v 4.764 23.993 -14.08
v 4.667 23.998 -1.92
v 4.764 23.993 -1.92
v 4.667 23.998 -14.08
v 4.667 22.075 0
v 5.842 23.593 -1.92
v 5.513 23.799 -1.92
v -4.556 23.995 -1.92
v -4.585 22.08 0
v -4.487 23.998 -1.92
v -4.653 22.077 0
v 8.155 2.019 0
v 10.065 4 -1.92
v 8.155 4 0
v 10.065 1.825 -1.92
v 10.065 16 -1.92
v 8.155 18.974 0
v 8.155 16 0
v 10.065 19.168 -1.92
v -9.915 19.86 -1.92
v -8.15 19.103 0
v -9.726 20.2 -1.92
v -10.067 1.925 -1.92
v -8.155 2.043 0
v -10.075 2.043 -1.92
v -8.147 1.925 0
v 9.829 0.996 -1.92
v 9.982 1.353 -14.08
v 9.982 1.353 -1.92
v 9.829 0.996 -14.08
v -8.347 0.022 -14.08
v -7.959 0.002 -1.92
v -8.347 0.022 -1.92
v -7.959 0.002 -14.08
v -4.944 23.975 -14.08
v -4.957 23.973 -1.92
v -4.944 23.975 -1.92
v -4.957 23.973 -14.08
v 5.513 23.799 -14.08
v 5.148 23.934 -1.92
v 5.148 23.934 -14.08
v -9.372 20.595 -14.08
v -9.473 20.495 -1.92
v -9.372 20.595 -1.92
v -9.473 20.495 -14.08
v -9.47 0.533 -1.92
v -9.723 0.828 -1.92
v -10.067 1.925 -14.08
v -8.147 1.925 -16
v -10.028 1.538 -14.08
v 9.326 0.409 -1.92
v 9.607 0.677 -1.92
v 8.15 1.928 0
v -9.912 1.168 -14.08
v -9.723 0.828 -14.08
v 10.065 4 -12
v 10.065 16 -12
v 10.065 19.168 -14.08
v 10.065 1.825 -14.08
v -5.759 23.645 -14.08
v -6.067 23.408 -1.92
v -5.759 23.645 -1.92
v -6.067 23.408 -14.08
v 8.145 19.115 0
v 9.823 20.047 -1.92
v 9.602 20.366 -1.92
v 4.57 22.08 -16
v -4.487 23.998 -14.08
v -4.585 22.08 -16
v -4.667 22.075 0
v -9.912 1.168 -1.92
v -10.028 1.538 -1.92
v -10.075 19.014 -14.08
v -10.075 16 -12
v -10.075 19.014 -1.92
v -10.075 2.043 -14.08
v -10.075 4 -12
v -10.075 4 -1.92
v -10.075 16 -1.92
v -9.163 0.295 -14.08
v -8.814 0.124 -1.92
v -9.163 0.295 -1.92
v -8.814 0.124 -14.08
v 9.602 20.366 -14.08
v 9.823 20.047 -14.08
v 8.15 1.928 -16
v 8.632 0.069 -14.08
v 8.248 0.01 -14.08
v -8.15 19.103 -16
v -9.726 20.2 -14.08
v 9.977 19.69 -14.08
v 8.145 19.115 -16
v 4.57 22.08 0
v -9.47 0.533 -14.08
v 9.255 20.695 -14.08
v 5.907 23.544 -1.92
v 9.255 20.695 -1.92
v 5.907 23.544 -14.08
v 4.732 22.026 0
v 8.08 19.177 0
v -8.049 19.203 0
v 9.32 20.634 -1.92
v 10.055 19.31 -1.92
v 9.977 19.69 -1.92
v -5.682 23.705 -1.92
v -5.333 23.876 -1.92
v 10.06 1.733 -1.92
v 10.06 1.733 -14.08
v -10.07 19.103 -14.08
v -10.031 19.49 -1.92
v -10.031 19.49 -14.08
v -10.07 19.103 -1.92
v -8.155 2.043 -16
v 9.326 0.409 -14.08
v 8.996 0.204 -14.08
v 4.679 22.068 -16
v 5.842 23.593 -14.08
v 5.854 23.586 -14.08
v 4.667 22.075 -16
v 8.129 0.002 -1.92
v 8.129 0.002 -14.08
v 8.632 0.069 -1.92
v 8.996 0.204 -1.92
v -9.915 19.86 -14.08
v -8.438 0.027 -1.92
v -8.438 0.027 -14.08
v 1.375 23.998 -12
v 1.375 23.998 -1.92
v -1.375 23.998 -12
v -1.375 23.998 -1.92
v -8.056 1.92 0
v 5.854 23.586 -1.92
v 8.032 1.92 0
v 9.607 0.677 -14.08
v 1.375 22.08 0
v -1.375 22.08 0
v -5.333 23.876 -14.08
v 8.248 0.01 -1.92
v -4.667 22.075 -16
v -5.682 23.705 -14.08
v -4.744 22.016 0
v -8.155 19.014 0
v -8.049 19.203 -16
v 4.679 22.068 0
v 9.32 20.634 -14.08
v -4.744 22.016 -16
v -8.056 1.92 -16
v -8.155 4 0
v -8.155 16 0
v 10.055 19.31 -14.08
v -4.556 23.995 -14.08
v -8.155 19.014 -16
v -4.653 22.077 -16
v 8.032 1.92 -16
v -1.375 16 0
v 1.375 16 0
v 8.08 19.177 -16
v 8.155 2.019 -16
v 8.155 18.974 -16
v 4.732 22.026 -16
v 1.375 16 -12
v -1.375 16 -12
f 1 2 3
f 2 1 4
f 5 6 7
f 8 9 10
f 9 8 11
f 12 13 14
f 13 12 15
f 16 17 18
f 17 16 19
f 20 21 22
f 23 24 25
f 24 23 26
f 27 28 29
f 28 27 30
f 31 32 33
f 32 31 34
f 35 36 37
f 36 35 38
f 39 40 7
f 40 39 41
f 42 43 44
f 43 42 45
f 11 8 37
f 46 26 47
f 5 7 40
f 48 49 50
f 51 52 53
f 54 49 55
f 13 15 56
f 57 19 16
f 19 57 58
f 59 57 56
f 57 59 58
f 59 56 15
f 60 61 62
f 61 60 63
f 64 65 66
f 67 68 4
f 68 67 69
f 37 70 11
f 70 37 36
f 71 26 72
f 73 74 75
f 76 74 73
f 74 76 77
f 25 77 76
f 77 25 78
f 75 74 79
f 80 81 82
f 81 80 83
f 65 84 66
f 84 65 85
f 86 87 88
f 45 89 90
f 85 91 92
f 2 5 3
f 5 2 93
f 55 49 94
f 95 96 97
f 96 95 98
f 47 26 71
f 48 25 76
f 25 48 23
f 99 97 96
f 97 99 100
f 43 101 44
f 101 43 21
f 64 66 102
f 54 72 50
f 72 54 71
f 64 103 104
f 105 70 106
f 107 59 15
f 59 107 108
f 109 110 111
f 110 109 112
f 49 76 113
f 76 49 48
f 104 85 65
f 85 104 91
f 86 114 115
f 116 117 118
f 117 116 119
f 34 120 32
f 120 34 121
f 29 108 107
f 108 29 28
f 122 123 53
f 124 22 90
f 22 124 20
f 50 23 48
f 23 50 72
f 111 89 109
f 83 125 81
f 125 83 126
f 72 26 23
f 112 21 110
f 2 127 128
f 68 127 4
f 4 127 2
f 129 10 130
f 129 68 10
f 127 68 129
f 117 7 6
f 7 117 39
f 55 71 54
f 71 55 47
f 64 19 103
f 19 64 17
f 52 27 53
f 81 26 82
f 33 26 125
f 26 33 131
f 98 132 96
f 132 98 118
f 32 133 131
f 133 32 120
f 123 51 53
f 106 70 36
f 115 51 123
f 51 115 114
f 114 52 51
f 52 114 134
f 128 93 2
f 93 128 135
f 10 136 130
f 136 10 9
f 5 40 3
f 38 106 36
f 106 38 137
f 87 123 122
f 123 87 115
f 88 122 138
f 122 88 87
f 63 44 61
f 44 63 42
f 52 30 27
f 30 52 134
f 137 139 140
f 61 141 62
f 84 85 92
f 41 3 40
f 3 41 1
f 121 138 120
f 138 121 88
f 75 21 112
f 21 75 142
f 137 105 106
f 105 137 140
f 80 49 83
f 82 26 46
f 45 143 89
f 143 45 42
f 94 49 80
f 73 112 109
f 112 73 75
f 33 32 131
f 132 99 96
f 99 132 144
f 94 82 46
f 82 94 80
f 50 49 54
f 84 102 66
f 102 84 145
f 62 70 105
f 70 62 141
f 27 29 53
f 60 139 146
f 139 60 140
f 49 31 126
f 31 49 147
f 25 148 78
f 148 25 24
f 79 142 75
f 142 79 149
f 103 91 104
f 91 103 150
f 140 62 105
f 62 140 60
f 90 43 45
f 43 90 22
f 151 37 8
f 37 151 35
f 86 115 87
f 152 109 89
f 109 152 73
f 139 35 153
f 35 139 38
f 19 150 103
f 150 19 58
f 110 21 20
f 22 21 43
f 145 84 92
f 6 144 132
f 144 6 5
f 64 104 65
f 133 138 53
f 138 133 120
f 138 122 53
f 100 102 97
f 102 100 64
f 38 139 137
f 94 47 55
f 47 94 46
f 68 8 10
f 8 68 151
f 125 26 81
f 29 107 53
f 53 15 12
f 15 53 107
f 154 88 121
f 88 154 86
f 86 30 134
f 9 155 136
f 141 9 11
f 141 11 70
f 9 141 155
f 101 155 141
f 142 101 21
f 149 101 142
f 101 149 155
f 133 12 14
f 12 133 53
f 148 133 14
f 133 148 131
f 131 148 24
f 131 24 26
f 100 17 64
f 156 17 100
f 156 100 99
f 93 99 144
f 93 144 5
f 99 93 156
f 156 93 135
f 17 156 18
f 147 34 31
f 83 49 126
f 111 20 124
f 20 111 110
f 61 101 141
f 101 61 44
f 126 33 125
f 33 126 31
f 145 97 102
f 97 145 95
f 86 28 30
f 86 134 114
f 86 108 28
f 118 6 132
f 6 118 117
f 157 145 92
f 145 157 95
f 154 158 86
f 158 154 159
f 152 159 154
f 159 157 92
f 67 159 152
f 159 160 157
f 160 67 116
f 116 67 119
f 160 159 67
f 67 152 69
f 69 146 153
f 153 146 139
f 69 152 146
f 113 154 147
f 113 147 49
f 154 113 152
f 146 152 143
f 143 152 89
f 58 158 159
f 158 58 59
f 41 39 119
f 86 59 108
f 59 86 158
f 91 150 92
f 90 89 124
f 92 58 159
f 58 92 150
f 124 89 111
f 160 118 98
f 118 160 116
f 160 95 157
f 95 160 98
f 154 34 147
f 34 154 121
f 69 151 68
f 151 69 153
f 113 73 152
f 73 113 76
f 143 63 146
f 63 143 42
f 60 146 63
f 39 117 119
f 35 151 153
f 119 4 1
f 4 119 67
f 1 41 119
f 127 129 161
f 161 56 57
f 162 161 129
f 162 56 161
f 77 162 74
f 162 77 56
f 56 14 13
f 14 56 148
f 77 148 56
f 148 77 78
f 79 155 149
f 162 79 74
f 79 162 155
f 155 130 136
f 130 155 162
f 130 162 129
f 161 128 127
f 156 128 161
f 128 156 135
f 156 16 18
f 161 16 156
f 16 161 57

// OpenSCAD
/*
 * Hanging file cabinet rail clips
 * By smkent (GitHub) / bulbasaur0 (Printables)
 *
 * Licensed under Creative Commons (4.0 International License) Attribution-ShareAlike
 */

/* [Rendering Options] */
Print_Orientation = true;

/* [Size] */
b_thick = 12;
r_thick = 2.75;
r_height = 12;
inset = 8.7;

thick = 4;
r_outset = 4;

/* [Advanced Options] */
/* [Development Toggles] */

module __end_customizer_options__() { }

// Constants //

$fa = $preview ? $fa : 2;
$fs = $preview ? $fs : 0.4;

b_len = inset * 2 + r_thick;
rr = thick * 0.48;
slop = 0.1;

// Modules //

module clip_cut() {
    translate([0, 0, -slop])
    linear_extrude(height=r_height + slop) {
        translate([-b_len, thick])
        square([b_len * 2, b_thick]);

        translate([-r_thick / 2, b_thick + thick])
        square([r_thick, r_outset + thick]);
    }
}

module clip_body_shape() {
    translate([-b_len / 2, 0])
    square([b_len, b_thick + thick * 2]);

    translate([-(r_thick + thick * 2) / 2, b_thick + thick])
    square([r_thick + thick * 2, r_outset + thick]);
}

module round_shape() {
    offset(r=-rr)
    offset(r=rr * 2)
    offset(r=-rr)
    children();
}

module clip_body() {
    minkowski() {
        union() {
            translate([0, 0, rr])
            linear_extrude(height=r_height + thick - rr * 2)
            offset(delta=-rr)
            round_shape()
            hull()
            clip_body_shape();
        }
        union() {
            // sphere(r=rr);
            for (mz = [0, 1])
            mirror([0, 0, mz])
            cylinder(r1=rr, r2=0, h=rr);
        }
    }
}

module clip() {
    difference() {
        clip_body();
        clip_cut();
    }
}

module main() {
    color("plum", 0.8)
    rotate([0, 180, 0])
    clip();
}

main();
